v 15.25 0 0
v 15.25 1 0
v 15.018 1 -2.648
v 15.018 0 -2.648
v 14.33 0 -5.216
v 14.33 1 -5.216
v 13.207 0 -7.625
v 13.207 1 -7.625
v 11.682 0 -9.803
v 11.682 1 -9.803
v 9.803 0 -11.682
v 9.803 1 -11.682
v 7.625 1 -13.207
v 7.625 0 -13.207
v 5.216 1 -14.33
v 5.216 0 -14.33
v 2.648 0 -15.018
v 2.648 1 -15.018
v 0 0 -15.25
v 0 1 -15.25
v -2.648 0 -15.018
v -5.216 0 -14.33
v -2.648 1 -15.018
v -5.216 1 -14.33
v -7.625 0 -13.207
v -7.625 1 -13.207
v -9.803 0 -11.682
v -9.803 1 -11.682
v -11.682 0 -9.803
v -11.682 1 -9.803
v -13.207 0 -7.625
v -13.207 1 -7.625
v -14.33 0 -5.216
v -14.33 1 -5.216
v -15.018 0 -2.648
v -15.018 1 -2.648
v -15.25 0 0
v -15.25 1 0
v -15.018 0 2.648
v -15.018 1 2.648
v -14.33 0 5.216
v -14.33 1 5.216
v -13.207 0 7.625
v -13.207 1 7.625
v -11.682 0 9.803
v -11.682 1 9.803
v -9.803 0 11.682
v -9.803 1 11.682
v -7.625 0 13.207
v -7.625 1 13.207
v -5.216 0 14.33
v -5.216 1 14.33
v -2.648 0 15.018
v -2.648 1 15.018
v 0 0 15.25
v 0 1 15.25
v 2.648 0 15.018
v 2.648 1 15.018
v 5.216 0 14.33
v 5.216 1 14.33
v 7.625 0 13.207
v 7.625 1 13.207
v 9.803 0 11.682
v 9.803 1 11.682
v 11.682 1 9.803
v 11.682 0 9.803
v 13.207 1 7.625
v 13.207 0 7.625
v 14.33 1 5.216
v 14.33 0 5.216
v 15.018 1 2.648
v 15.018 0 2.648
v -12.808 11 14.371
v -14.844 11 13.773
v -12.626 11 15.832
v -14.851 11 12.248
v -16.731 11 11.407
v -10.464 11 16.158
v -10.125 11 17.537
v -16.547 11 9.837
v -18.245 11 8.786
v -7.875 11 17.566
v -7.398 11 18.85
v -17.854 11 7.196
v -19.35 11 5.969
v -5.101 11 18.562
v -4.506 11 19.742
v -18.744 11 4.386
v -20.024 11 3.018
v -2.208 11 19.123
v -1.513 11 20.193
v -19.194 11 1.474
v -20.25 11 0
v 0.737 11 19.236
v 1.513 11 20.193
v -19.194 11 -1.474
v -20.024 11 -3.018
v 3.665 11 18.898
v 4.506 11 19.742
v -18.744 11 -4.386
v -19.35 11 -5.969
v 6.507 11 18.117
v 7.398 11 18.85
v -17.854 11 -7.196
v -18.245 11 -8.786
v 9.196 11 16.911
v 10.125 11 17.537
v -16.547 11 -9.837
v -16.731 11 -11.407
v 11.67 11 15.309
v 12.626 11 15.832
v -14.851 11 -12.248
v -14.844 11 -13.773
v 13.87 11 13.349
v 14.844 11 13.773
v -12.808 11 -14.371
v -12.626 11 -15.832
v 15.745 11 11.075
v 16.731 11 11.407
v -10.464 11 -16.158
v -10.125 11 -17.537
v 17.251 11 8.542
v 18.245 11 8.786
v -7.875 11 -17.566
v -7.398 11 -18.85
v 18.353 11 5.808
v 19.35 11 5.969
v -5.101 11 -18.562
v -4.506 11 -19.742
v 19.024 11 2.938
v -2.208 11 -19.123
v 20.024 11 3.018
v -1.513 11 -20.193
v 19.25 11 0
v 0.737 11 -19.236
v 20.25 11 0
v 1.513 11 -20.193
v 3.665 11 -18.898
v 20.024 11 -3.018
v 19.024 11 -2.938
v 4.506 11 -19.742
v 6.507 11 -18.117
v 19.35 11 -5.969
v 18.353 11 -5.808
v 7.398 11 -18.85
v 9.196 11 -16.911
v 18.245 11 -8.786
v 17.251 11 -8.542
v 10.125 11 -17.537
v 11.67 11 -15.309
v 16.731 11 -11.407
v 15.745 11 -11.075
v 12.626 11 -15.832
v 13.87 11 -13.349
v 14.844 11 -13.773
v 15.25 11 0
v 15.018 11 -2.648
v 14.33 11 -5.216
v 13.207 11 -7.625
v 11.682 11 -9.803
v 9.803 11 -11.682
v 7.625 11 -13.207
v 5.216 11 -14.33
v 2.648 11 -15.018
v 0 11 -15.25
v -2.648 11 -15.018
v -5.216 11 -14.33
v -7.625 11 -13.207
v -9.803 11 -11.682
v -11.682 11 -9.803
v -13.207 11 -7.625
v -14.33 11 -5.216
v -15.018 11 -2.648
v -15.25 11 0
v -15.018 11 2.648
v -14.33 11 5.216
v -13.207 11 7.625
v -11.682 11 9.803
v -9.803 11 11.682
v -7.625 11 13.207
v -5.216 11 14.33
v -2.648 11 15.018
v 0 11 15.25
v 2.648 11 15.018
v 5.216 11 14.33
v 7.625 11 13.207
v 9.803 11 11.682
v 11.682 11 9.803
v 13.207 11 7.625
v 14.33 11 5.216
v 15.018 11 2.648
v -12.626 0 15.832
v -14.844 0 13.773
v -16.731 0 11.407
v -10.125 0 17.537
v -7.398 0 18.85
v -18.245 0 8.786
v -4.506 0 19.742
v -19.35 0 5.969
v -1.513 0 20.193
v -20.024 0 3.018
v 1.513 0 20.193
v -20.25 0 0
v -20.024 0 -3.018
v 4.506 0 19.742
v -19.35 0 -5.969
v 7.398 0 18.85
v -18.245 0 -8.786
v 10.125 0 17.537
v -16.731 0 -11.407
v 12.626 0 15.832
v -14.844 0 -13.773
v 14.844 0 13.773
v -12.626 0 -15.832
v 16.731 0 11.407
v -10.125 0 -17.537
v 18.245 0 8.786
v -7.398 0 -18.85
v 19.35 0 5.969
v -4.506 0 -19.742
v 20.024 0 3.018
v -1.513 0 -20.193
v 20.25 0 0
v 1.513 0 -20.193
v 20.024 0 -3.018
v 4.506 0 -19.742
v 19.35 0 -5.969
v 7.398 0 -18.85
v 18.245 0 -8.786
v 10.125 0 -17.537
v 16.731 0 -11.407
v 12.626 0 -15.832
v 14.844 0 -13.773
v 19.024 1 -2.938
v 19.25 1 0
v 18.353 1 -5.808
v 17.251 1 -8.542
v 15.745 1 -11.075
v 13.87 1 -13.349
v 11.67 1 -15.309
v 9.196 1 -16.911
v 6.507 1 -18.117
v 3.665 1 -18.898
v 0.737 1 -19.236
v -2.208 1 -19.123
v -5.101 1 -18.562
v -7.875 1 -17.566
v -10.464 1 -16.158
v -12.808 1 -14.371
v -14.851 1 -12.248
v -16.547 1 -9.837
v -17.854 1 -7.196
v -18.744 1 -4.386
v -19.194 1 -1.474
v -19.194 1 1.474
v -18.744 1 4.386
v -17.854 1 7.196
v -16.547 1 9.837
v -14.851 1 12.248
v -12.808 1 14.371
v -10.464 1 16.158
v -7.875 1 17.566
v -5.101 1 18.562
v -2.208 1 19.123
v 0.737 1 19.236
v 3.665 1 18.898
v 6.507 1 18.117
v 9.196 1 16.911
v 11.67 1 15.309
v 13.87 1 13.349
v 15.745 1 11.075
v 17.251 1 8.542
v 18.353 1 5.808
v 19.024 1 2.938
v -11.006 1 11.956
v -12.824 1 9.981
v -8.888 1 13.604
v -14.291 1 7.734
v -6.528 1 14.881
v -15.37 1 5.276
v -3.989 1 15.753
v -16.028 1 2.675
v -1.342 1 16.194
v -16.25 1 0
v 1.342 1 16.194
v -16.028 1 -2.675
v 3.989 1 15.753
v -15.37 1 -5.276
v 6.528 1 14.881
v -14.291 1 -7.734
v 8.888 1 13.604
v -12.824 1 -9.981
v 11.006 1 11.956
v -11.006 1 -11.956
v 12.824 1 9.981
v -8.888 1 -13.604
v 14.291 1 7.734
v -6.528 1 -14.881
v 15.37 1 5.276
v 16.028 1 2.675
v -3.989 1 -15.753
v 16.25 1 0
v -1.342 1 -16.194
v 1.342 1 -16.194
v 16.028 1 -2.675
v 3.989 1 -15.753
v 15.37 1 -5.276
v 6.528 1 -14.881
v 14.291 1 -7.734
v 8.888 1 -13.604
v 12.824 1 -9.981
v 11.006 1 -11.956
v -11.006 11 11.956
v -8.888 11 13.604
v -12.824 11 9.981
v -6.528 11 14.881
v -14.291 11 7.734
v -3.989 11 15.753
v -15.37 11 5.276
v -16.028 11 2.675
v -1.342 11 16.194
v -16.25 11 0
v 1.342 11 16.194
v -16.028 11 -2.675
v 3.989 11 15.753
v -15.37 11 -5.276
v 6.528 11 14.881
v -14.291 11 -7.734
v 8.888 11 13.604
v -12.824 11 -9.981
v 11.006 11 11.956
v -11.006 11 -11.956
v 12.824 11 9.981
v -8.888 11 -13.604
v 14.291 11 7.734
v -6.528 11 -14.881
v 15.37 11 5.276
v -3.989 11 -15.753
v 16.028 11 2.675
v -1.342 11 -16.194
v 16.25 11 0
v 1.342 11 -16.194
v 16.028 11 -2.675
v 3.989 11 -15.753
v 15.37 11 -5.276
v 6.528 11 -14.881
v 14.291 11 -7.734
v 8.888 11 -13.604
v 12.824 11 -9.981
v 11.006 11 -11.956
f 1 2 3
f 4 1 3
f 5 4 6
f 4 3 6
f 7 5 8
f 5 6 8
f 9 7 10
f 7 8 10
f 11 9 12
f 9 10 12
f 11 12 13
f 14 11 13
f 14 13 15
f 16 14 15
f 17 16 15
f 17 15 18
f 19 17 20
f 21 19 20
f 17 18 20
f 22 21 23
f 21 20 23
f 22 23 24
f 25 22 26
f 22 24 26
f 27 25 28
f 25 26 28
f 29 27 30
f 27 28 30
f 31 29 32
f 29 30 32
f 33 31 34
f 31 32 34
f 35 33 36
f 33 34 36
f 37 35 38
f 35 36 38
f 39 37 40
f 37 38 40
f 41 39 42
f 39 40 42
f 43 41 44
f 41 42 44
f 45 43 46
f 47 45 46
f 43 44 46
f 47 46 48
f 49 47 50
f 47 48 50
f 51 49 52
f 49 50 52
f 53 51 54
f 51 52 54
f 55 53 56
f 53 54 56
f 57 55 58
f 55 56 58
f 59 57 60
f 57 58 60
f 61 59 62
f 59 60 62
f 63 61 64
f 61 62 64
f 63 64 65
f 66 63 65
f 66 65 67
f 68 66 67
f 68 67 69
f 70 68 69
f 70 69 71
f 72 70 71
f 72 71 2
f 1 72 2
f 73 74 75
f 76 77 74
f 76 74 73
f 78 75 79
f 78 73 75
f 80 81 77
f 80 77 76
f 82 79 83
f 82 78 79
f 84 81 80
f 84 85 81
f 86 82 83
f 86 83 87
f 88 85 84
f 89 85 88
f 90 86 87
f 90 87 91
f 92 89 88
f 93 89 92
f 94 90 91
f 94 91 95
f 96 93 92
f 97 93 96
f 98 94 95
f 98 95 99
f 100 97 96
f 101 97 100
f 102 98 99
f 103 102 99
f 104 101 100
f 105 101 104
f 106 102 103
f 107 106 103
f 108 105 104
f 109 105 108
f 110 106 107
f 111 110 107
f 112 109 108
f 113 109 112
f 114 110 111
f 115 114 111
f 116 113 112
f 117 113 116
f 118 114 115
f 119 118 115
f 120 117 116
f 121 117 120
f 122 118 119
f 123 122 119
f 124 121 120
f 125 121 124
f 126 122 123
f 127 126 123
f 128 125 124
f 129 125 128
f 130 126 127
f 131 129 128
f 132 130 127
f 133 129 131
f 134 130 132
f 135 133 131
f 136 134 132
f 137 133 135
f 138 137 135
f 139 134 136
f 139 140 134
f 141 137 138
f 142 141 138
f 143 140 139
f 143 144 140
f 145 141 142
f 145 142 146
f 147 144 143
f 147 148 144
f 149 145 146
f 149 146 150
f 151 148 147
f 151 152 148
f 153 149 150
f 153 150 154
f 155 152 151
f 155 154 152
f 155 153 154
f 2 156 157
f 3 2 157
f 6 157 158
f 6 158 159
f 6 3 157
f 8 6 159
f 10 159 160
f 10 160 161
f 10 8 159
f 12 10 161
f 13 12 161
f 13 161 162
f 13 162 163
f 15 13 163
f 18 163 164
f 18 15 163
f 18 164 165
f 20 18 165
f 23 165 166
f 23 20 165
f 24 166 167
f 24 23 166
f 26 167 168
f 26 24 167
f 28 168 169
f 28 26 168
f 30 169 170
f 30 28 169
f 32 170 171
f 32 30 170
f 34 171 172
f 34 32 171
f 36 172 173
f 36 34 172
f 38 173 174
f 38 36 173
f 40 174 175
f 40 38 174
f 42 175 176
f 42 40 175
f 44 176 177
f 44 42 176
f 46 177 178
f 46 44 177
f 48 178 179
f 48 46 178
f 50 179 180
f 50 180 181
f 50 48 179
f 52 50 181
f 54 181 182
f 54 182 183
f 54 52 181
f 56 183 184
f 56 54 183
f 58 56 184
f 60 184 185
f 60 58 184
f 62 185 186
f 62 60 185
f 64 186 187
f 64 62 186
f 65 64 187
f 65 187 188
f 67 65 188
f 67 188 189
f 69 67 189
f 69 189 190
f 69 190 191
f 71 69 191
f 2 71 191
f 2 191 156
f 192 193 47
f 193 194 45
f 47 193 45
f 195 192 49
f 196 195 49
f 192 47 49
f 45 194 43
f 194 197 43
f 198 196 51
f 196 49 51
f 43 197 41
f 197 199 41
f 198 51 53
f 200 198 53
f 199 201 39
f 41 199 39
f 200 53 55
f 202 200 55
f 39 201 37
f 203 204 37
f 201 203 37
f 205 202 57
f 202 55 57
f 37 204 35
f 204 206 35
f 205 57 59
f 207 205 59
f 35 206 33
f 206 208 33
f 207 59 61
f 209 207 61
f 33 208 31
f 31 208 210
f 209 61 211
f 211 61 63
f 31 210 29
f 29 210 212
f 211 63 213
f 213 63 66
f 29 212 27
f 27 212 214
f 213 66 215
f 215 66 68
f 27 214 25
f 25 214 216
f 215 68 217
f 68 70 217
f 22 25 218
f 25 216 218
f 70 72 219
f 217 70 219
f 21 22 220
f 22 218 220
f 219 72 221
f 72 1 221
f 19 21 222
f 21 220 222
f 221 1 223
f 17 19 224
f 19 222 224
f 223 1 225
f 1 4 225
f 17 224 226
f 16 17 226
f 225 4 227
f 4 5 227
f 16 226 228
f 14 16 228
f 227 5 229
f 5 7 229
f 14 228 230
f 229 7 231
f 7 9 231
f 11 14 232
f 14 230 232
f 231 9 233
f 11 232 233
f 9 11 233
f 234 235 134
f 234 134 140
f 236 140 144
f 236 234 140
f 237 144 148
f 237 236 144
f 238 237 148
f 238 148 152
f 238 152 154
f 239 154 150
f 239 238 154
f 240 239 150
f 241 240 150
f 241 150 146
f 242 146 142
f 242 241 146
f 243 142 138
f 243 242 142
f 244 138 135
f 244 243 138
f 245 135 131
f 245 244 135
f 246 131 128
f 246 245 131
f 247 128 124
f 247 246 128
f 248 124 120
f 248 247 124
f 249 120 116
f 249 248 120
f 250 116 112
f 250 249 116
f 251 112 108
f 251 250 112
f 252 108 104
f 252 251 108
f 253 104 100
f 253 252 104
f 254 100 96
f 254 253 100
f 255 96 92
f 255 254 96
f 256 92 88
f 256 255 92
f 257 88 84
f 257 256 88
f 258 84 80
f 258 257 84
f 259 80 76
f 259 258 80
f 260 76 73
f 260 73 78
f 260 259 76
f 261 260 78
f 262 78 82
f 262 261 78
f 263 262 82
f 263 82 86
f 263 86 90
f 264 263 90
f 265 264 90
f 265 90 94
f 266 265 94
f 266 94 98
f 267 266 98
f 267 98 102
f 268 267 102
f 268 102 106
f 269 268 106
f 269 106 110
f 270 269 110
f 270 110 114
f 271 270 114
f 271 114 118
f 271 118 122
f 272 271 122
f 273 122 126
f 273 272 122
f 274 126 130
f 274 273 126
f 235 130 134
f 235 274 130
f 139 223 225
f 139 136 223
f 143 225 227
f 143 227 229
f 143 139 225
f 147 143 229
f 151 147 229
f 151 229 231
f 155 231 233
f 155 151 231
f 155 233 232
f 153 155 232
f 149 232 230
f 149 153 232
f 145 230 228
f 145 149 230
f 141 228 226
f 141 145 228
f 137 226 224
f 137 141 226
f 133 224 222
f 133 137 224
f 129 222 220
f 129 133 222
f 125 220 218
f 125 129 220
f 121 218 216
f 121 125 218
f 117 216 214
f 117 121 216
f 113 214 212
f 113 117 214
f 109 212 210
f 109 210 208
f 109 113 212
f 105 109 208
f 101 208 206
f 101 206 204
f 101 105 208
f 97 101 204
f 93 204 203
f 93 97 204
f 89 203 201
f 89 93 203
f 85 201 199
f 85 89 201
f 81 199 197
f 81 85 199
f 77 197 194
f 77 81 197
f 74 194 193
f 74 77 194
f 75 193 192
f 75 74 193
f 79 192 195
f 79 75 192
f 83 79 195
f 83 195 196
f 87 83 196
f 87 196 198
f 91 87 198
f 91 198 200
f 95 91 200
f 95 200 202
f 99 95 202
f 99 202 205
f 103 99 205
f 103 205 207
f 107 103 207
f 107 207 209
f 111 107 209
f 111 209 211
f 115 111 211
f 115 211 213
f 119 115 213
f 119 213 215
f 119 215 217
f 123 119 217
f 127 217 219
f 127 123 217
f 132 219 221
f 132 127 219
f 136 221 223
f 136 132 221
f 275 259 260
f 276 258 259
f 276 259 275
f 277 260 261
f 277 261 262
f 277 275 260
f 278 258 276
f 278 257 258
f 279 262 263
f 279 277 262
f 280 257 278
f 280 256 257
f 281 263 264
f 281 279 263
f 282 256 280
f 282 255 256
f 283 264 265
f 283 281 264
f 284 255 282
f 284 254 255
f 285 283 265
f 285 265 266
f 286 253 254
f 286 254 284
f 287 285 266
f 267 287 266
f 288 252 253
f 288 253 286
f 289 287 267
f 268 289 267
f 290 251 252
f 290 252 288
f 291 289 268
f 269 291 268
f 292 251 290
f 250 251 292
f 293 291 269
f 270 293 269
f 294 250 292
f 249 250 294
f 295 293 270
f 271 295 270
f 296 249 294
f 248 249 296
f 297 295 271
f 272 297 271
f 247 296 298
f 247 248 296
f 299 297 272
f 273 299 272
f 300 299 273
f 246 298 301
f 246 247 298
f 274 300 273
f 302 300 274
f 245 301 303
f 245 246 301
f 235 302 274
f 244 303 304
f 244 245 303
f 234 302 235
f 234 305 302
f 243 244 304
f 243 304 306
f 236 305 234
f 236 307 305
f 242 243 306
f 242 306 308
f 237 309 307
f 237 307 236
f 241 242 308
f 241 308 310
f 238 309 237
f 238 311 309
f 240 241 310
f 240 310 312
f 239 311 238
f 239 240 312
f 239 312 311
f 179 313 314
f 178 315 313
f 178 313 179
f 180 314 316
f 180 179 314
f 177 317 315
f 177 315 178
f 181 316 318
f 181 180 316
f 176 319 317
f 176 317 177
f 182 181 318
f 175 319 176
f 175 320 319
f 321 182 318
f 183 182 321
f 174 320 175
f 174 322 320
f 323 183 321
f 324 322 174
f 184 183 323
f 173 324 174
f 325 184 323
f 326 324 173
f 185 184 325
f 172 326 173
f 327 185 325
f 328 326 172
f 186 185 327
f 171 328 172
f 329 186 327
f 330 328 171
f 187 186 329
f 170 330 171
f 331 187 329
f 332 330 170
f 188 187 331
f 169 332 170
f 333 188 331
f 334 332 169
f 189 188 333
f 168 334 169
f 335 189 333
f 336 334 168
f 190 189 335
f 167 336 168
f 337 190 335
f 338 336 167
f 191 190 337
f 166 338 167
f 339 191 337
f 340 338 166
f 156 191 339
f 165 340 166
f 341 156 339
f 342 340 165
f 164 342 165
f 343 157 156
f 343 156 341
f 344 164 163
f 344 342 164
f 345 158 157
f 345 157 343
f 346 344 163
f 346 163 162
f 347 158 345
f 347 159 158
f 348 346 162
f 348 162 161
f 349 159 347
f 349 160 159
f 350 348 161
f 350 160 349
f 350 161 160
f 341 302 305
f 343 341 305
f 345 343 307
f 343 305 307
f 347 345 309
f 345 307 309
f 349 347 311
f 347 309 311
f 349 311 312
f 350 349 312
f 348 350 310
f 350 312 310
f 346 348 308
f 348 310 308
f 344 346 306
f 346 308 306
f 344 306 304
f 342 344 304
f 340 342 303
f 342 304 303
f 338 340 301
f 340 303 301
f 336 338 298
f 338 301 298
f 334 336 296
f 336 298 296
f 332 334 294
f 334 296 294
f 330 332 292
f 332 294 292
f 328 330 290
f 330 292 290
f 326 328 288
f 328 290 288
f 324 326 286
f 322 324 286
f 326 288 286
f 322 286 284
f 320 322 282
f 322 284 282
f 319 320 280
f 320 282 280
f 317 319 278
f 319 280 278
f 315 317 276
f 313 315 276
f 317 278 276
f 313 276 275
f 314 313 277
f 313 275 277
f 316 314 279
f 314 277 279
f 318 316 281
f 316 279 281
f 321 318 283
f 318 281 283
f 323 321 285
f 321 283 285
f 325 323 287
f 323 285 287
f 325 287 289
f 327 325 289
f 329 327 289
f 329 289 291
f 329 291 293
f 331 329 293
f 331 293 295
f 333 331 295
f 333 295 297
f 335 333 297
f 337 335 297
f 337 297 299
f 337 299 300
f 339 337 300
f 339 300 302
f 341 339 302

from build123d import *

# Parameters (mm, degrees)
SKETCH_1_R           = 19.25
SKETCH_1_R_2         = 16.25
EXTRUDE_1_DEPTH      = 1
SKETCH_3_R           = 20.25
SKETCH_3_R_2         = 19.25
SKETCH_3_R_3         = 16.25
SKETCH_3_R_4         = 15.25
EXTRUDE_3_DEPTH      = 10
EXTRUDE_3_DEPTH_BACK = 1


with BuildPart() as part:
    # 草图1 → 凸台-拉伸1 (new body)
    with BuildSketch(Plane(origin=(0, 0, 0), x_dir=(1, 0, 0), z_dir=(0, 1, 0))):
        Circle(SKETCH_1_R)
        Circle(SKETCH_1_R_2, mode=Mode.SUBTRACT)
    extrude(amount=EXTRUDE_1_DEPTH)

    # 草图3 → 凸台-拉伸3 (add, two sides)
    with BuildSketch(Plane(origin=(0, 1, 0), x_dir=(1, 0, 0), z_dir=(0, 1, 0))) as extrude_3_sk:
        Circle(SKETCH_3_R)
        Circle(SKETCH_3_R_2, mode=Mode.SUBTRACT)
        Circle(SKETCH_3_R_3)
        Circle(SKETCH_3_R_4, mode=Mode.SUBTRACT)
    extrude(amount=EXTRUDE_3_DEPTH)
    extrude(extrude_3_sk.sketch, amount=-EXTRUDE_3_DEPTH_BACK)


solid = part.part
